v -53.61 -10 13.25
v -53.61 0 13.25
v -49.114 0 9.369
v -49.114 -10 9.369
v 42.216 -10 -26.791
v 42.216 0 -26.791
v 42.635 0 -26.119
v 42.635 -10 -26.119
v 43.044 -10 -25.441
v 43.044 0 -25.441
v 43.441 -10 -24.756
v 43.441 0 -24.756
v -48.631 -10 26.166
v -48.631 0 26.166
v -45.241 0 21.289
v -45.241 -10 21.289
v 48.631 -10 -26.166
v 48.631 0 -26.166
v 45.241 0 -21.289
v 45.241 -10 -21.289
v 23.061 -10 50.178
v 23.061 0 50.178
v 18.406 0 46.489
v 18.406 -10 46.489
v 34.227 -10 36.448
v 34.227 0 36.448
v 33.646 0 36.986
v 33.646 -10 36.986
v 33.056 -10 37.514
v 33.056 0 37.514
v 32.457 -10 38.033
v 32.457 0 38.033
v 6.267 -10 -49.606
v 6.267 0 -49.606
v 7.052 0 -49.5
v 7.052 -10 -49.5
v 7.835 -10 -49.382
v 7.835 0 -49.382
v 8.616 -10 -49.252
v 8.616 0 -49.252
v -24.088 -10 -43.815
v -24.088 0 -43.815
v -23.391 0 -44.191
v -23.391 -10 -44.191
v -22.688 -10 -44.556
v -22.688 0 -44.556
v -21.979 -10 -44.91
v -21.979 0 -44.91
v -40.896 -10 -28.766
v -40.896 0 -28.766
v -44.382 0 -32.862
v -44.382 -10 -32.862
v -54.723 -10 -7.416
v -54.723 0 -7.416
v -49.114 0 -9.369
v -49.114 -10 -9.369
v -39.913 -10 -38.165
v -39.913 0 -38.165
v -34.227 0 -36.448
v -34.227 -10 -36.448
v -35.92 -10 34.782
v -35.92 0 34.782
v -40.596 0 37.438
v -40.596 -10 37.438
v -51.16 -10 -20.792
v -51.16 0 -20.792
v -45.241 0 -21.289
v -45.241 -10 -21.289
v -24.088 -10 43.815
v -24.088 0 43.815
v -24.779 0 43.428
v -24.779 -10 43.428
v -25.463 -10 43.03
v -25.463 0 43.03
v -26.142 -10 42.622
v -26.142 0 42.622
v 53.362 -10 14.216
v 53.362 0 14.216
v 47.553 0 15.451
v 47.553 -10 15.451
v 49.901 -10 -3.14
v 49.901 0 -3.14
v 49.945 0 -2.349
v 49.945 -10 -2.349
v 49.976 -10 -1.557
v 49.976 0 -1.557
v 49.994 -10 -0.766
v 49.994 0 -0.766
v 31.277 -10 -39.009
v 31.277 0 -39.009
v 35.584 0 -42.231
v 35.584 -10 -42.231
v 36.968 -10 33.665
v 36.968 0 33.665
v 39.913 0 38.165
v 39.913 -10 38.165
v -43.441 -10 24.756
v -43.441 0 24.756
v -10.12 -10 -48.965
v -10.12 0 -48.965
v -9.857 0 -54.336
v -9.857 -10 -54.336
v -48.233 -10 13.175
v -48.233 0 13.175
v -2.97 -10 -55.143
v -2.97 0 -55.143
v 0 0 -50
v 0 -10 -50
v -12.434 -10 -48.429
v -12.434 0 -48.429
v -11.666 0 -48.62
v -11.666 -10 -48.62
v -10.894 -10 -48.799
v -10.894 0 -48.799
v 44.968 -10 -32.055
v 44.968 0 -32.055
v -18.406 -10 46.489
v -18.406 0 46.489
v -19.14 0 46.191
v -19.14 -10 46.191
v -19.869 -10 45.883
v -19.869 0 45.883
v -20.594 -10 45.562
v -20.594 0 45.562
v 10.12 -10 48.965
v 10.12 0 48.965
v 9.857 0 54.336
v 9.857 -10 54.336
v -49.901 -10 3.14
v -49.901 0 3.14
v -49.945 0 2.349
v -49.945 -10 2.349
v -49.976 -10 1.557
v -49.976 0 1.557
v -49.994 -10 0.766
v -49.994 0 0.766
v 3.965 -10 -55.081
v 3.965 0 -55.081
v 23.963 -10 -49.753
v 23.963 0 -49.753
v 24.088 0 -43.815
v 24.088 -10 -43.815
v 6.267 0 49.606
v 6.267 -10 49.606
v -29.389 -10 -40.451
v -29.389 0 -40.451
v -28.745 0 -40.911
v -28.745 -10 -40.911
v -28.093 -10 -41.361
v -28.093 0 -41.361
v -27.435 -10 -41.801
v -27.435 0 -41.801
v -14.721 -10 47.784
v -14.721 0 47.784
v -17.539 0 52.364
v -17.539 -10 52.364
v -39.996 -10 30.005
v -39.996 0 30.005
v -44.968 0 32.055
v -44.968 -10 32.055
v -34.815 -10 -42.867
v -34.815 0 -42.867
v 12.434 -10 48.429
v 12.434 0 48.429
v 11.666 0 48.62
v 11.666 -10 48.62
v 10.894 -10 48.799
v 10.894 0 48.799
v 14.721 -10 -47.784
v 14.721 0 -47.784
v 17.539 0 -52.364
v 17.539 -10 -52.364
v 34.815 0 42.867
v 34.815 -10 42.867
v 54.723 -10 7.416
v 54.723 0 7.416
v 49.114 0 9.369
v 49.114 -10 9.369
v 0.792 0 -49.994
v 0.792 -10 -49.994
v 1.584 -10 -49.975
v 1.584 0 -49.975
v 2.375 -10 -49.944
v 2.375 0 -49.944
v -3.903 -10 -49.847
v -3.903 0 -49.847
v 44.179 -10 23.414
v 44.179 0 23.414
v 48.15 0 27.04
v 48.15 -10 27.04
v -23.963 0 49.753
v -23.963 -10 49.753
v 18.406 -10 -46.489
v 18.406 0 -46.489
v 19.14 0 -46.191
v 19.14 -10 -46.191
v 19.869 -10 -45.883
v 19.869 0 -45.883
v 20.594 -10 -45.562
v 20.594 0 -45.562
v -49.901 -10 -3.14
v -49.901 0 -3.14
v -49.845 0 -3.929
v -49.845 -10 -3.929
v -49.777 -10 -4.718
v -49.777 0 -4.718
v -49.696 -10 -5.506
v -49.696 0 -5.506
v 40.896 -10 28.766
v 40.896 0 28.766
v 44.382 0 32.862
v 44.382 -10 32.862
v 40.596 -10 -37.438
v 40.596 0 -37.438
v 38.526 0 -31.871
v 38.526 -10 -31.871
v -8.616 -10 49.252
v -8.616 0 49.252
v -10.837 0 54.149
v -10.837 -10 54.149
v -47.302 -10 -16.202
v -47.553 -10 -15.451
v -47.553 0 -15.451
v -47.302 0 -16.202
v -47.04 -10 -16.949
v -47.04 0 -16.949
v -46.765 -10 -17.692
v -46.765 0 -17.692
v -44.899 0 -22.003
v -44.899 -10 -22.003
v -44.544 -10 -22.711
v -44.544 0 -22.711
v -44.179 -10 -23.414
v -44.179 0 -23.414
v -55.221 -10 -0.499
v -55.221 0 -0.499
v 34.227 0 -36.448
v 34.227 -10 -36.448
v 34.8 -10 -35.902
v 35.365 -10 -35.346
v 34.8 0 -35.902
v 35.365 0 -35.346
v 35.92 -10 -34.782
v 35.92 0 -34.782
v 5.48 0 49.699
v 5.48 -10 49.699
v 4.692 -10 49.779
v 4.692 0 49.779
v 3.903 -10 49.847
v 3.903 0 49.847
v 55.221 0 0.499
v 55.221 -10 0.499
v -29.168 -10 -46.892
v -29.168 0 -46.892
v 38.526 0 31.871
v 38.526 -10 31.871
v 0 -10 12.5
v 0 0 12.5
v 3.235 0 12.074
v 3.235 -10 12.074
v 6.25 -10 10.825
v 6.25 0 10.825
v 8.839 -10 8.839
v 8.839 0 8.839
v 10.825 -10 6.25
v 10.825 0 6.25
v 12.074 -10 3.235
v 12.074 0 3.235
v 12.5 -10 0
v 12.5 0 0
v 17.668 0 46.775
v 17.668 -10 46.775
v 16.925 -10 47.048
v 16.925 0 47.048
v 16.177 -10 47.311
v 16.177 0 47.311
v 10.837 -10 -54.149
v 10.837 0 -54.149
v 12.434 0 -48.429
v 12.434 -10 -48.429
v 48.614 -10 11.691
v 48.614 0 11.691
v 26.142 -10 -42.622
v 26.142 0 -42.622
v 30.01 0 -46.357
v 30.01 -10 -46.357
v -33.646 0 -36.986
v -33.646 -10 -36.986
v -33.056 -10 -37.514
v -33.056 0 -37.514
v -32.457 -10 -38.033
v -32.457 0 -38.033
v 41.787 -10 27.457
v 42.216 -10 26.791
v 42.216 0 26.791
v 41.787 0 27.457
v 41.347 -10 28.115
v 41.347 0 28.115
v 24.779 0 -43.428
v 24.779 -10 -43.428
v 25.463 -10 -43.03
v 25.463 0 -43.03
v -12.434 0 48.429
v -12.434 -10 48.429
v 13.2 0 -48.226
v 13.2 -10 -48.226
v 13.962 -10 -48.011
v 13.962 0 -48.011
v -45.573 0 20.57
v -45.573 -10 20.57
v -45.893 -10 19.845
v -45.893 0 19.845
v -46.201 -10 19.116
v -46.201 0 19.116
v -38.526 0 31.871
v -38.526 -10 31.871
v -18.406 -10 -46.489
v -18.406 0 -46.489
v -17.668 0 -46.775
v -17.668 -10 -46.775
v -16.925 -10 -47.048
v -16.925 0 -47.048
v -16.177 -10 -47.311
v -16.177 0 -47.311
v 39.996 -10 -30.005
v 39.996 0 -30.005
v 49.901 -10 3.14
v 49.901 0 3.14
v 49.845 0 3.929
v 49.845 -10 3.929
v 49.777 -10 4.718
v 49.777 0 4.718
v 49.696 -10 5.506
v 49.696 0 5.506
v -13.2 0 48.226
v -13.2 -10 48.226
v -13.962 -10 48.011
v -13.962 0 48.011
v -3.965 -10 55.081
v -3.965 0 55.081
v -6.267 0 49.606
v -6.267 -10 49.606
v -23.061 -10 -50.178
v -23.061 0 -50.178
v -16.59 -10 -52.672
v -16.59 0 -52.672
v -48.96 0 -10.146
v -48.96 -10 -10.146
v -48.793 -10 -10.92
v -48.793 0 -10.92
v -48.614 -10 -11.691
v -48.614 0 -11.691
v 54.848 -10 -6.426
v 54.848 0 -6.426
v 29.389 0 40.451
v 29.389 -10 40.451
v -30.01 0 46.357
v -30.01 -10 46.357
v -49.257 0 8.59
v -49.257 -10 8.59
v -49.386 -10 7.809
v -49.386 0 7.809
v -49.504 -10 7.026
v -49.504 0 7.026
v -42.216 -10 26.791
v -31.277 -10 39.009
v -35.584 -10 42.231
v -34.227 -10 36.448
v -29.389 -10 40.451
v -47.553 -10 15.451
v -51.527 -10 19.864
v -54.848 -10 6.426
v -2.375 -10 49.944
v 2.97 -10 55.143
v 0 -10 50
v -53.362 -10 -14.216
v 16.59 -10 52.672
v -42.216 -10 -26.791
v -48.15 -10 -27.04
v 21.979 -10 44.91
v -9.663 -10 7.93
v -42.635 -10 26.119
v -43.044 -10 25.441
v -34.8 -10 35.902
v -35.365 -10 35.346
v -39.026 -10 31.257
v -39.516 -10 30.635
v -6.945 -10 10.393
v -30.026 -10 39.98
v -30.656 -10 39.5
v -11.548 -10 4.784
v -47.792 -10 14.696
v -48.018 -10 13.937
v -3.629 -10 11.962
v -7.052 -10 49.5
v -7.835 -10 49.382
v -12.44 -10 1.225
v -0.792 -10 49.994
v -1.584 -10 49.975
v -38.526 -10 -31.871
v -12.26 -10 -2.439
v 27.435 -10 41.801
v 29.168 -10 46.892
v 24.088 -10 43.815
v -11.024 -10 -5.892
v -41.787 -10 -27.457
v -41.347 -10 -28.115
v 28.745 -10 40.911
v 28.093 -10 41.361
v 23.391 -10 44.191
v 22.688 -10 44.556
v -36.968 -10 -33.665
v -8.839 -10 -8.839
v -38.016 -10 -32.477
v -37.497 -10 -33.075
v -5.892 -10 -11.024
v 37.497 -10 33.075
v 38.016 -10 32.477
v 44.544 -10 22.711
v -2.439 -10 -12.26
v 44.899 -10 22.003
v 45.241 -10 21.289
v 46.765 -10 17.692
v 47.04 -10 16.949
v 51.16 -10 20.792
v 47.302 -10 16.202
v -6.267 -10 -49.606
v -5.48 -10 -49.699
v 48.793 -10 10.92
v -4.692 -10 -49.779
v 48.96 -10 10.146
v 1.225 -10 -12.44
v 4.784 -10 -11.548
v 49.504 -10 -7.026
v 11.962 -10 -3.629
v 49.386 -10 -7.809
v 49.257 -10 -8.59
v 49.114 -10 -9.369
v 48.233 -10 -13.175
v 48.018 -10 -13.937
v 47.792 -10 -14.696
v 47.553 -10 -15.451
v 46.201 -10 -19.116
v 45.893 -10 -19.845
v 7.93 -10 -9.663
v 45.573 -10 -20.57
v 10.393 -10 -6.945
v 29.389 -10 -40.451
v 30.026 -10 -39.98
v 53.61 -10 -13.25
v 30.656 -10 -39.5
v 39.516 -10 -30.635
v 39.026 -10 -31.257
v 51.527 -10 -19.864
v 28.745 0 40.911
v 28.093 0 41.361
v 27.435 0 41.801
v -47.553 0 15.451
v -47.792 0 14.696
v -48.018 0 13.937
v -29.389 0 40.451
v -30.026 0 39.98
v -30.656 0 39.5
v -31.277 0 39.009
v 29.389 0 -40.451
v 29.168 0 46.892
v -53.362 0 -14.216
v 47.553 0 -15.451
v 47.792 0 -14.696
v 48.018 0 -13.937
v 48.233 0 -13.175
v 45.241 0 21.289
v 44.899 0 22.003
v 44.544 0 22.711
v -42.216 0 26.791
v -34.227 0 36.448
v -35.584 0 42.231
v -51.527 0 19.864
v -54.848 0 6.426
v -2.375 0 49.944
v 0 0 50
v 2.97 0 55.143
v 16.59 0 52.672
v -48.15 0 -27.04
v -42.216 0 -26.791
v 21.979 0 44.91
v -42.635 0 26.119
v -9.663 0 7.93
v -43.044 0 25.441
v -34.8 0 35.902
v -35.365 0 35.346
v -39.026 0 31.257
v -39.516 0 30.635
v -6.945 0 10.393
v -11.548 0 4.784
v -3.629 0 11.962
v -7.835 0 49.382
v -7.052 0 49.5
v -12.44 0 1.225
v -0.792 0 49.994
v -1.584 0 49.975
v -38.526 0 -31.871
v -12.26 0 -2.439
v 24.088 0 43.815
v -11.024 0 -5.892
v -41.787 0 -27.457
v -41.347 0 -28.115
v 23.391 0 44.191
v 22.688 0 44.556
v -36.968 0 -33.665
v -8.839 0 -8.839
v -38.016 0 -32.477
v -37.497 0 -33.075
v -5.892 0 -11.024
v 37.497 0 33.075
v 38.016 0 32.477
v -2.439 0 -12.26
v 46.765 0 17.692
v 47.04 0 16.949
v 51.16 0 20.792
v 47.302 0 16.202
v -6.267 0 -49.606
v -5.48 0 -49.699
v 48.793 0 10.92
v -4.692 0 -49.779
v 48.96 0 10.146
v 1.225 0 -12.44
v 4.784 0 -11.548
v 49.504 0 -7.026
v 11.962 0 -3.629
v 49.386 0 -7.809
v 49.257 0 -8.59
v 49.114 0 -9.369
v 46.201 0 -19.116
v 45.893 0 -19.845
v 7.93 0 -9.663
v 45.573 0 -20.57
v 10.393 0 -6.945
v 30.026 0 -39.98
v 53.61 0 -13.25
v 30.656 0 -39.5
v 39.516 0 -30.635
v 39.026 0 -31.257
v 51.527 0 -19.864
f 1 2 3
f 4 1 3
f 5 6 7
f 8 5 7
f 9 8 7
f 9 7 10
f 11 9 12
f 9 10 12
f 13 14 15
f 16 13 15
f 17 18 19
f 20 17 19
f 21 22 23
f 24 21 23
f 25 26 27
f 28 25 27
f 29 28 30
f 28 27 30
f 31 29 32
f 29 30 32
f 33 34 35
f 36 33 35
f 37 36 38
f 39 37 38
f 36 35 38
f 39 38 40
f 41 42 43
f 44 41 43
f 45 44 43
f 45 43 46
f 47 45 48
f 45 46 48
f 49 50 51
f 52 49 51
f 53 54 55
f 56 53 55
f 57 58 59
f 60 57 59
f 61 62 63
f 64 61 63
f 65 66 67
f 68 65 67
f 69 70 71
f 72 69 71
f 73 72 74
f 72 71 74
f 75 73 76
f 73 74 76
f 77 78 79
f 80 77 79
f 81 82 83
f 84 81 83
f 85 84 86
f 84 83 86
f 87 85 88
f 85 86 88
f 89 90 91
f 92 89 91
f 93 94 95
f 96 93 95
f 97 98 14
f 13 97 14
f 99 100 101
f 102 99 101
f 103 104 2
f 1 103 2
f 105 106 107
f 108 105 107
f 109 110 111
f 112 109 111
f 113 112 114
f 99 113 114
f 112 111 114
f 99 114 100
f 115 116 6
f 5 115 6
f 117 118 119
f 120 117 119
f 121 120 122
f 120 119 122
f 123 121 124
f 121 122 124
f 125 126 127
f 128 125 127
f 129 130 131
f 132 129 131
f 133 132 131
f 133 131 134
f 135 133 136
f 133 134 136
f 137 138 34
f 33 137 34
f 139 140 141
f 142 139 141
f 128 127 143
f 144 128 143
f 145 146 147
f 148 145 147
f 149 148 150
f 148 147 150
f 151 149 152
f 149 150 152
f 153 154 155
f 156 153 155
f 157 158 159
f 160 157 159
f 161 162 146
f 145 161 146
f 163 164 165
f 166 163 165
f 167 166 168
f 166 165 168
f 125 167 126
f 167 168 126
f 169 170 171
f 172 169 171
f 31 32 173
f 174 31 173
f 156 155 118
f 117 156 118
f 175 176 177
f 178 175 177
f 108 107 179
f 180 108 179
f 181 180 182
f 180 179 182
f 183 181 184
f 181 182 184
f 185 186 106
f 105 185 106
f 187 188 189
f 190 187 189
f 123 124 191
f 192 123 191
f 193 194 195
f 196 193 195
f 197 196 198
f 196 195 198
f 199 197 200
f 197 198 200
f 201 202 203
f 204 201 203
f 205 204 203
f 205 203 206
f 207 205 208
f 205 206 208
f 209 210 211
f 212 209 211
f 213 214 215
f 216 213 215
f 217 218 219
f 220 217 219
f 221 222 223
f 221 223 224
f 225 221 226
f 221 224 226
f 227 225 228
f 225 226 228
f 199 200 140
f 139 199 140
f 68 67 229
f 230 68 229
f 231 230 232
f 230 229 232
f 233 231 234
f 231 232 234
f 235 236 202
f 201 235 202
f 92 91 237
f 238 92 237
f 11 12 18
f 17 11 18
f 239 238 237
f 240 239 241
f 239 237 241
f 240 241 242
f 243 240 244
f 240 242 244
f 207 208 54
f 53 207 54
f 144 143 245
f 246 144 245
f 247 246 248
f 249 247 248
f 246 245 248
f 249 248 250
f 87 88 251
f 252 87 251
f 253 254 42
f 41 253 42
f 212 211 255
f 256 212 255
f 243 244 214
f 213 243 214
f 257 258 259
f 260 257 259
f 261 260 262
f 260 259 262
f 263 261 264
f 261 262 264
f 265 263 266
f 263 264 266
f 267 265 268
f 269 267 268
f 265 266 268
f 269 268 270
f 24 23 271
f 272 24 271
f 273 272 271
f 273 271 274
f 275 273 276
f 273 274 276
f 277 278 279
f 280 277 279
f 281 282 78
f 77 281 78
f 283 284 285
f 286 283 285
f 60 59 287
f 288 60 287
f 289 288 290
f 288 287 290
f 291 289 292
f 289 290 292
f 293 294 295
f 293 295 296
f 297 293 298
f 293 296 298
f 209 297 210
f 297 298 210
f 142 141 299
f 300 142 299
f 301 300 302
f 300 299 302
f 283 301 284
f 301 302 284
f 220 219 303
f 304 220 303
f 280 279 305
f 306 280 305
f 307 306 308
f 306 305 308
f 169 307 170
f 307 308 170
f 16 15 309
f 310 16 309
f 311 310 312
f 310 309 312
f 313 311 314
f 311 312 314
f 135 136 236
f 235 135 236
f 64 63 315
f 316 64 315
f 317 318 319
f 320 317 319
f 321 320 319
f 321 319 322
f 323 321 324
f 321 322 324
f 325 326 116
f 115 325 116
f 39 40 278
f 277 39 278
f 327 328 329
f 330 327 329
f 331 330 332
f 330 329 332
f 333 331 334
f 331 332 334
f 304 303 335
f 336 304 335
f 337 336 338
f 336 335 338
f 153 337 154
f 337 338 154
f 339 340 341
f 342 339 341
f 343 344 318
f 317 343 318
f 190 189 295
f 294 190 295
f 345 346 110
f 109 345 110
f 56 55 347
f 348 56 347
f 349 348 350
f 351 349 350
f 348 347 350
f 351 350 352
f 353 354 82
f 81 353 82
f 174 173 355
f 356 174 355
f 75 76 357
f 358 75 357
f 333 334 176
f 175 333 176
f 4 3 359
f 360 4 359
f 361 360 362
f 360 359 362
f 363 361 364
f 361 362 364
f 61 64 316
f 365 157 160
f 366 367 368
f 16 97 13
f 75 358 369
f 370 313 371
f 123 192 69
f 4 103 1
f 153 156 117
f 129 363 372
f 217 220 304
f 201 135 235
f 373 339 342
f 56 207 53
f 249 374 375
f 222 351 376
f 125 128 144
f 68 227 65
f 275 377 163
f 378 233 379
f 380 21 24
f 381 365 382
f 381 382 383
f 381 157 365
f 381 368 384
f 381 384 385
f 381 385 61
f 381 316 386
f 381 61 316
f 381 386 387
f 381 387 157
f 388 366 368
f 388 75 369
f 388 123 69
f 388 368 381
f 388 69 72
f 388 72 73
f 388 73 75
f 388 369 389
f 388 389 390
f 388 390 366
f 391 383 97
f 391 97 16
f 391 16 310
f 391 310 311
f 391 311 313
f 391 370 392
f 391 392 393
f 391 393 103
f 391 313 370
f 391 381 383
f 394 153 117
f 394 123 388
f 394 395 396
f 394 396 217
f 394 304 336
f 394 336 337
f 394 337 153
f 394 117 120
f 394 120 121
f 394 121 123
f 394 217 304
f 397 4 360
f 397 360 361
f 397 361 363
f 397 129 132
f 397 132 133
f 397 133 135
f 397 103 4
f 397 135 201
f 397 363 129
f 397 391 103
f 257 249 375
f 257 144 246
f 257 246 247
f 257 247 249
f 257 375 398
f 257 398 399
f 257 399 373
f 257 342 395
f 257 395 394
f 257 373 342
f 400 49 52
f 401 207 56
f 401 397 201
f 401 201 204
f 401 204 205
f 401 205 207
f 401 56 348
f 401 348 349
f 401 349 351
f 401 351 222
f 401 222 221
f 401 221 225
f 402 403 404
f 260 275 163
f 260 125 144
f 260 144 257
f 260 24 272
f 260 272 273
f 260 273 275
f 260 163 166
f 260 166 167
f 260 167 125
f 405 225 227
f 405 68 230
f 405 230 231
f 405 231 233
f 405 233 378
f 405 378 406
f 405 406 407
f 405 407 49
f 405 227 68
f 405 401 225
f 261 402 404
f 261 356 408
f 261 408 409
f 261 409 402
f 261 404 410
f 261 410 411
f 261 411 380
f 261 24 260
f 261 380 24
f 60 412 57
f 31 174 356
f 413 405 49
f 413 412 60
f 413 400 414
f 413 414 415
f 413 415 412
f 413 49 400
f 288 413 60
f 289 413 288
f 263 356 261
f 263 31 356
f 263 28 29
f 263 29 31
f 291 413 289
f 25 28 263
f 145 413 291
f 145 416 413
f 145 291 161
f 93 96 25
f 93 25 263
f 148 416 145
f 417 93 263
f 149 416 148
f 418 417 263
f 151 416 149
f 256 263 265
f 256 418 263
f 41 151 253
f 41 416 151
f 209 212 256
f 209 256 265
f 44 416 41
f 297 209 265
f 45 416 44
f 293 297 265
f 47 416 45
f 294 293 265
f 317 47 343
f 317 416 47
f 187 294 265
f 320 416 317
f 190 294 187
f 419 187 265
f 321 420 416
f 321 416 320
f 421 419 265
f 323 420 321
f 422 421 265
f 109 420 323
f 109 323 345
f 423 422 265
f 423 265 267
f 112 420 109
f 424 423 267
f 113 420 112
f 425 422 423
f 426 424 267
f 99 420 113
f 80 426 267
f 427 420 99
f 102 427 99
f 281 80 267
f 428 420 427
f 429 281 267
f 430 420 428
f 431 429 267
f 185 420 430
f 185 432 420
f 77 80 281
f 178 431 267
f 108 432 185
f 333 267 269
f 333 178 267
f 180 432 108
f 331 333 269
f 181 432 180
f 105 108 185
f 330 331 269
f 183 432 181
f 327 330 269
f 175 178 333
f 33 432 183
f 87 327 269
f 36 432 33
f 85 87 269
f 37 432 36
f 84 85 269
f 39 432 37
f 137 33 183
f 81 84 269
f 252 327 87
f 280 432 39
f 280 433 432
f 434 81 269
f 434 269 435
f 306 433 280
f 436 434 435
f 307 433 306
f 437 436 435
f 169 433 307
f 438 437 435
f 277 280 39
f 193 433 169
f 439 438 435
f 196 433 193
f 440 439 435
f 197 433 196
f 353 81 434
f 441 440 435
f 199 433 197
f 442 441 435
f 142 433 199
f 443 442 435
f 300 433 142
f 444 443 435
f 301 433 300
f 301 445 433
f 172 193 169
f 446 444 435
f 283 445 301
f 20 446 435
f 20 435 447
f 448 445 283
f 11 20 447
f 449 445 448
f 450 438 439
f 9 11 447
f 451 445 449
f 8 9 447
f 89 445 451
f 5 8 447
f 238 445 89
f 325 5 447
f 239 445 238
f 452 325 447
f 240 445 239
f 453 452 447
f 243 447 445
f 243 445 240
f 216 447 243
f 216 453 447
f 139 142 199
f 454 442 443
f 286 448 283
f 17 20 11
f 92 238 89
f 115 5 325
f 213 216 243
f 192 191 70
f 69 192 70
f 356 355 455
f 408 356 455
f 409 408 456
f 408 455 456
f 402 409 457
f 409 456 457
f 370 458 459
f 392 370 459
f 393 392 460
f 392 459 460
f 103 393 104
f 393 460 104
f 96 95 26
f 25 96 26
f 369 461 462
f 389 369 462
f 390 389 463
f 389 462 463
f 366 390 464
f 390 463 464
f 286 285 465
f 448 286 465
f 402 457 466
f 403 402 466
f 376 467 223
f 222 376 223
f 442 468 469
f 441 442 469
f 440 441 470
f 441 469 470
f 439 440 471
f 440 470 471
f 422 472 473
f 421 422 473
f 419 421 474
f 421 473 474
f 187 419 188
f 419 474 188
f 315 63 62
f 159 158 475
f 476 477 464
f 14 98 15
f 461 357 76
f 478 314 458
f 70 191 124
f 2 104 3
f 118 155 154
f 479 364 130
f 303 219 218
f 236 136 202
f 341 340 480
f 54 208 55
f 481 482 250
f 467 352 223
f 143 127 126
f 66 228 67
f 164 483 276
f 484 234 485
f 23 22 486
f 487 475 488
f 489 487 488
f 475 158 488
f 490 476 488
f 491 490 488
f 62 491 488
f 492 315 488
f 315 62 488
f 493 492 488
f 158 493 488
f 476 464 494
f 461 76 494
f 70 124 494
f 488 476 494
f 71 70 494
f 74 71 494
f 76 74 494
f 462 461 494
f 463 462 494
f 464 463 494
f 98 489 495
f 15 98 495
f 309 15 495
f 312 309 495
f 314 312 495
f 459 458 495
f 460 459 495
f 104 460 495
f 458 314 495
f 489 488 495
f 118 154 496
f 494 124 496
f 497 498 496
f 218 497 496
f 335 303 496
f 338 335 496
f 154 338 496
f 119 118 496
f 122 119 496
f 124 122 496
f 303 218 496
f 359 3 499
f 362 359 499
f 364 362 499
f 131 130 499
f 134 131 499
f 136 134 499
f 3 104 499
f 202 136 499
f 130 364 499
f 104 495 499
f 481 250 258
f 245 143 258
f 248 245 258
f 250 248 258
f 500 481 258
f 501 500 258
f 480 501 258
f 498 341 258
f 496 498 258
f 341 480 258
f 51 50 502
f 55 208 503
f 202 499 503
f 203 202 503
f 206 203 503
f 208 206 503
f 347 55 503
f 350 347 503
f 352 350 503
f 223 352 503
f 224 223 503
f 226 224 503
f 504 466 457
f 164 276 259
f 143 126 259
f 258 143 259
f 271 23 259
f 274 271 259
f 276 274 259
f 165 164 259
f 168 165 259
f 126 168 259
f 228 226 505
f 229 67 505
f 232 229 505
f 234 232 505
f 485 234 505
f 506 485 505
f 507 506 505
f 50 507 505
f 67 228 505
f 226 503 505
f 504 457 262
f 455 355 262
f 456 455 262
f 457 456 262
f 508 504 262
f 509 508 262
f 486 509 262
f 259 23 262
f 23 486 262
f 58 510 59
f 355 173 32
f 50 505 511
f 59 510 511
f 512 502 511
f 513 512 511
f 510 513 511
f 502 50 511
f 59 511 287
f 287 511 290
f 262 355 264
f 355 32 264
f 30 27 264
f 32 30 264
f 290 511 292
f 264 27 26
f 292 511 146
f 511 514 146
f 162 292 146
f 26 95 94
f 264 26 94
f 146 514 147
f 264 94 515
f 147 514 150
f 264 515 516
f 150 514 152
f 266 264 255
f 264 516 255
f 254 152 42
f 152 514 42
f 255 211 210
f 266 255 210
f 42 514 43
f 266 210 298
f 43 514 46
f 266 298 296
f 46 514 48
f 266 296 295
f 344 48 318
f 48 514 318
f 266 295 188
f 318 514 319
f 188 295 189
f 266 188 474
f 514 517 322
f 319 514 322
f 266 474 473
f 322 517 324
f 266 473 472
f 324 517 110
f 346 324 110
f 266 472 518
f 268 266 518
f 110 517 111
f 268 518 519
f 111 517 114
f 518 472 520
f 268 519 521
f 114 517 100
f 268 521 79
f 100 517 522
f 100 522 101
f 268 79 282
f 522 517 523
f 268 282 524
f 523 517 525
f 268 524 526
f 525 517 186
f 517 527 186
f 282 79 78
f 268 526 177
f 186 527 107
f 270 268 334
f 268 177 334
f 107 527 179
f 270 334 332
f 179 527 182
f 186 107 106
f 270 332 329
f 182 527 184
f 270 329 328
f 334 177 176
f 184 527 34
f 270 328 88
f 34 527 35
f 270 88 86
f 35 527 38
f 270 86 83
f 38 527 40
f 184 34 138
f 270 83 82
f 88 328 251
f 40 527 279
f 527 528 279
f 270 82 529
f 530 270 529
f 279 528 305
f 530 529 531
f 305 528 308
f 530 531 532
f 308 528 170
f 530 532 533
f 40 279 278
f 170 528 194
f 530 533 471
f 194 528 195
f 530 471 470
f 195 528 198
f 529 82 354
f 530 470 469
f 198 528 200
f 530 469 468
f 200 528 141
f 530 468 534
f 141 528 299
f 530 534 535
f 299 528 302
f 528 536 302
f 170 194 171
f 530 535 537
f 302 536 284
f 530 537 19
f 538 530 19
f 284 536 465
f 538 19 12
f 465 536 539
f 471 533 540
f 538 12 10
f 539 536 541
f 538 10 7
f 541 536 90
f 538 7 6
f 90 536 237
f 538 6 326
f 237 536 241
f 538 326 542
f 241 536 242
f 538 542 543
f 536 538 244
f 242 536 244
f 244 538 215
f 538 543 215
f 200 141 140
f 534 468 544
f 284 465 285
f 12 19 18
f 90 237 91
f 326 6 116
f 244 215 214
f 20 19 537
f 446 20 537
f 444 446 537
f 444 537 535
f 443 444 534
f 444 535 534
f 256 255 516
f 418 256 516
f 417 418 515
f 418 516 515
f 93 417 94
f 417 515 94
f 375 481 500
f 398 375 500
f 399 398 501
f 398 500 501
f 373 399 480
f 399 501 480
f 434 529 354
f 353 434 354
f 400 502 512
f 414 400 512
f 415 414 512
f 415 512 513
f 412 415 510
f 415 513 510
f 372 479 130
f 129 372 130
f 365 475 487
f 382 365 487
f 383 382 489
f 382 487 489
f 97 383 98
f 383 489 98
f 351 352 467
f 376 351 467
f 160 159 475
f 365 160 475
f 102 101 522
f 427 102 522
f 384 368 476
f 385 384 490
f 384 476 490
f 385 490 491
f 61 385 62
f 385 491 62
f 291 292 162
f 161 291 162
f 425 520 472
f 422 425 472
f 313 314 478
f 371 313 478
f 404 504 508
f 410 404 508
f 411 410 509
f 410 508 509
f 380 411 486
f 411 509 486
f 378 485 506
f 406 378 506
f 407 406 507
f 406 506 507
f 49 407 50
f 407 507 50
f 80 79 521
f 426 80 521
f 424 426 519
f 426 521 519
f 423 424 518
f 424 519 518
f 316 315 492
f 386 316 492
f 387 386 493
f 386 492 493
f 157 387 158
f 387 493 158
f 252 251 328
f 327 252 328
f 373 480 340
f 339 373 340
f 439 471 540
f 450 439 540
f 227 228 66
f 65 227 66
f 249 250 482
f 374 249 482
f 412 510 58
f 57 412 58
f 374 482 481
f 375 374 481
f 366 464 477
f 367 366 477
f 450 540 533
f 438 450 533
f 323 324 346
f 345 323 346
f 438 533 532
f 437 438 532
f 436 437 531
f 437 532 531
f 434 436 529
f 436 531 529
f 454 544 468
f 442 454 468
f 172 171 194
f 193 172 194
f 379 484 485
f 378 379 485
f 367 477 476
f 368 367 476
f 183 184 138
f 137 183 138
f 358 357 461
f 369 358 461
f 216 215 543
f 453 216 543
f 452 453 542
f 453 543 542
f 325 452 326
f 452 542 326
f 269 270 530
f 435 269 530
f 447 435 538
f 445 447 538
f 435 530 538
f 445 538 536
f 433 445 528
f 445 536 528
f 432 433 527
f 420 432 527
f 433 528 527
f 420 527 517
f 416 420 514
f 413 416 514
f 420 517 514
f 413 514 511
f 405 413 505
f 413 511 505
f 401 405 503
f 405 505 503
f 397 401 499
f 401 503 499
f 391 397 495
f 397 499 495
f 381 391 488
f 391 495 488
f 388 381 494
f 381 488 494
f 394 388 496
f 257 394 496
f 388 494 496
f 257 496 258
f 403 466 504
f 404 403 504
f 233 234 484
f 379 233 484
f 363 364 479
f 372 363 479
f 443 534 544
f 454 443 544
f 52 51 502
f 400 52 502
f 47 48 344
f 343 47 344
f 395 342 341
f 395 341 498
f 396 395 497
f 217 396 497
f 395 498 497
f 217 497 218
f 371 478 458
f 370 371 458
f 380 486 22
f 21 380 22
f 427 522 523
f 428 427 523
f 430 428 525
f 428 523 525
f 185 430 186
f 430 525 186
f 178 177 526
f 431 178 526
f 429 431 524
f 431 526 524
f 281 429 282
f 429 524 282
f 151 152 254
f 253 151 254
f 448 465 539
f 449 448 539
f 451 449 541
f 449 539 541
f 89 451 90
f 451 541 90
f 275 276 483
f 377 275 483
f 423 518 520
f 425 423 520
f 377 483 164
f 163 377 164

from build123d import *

# Parameters (mm, degrees)
F1_DEPTH        = 10
F2_DEPTH        = 10
F2_COPIES_COUNT = 50


# Not quite as in the source:
# - a pattern or mirror of a feature is missing from the dataset's text; its kind, count and spacing are read off the source's solid


with BuildPart() as f1:
    # F0 (on Front) → F1 (new body)
    with BuildSketch(Plane.XZ):
        with BuildLine():
            ThreePointArc((0, 50), (-35.3553390593, -35.3553390593), (50, 0))
            ThreePointArc((50, 0), (36.7094642634, 33.947241913), (3.9033906601, 49.8474025537))
            ThreePointArc((3.9033906601, 49.8474025537), (1.9531861551, 49.9618360736), (0, 50))
        make_face()
        with BuildLine():
            ThreePointArc((12.5, 0), (-8.8388347648, -8.8388347648), (0, 12.5))
            ThreePointArc((0, 12.5), (8.8388347648, 8.8388347648), (12.5, 0))
        make_face(mode=Mode.SUBTRACT)
    extrude(amount=F1_DEPTH)

    # F0 (on Front) → F2 (join)
    with BuildSketch(Plane.XZ):
        with BuildLine():
            ThreePointArc((0, 50), (1.9531861551, 49.9618360736), (3.9033906601, 49.8474025537))
            Line((3.9033906601, 49.8474025537), (2.9695587307, 55.1434265976))
            Line((2.9695587307, 55.1434265976), (0, 50))
        make_face()
    f2 = extrude(amount=F2_DEPTH)

    # F2_copies: F2 ×50 about axis
    f2_copies_axis = Axis((0, 0, 0), (0, 1, 0))
    for i in range(1, F2_COPIES_COUNT):
        add(f2.rotate(f2_copies_axis, i * 360 / F2_COPIES_COUNT))


solid = f1.part
